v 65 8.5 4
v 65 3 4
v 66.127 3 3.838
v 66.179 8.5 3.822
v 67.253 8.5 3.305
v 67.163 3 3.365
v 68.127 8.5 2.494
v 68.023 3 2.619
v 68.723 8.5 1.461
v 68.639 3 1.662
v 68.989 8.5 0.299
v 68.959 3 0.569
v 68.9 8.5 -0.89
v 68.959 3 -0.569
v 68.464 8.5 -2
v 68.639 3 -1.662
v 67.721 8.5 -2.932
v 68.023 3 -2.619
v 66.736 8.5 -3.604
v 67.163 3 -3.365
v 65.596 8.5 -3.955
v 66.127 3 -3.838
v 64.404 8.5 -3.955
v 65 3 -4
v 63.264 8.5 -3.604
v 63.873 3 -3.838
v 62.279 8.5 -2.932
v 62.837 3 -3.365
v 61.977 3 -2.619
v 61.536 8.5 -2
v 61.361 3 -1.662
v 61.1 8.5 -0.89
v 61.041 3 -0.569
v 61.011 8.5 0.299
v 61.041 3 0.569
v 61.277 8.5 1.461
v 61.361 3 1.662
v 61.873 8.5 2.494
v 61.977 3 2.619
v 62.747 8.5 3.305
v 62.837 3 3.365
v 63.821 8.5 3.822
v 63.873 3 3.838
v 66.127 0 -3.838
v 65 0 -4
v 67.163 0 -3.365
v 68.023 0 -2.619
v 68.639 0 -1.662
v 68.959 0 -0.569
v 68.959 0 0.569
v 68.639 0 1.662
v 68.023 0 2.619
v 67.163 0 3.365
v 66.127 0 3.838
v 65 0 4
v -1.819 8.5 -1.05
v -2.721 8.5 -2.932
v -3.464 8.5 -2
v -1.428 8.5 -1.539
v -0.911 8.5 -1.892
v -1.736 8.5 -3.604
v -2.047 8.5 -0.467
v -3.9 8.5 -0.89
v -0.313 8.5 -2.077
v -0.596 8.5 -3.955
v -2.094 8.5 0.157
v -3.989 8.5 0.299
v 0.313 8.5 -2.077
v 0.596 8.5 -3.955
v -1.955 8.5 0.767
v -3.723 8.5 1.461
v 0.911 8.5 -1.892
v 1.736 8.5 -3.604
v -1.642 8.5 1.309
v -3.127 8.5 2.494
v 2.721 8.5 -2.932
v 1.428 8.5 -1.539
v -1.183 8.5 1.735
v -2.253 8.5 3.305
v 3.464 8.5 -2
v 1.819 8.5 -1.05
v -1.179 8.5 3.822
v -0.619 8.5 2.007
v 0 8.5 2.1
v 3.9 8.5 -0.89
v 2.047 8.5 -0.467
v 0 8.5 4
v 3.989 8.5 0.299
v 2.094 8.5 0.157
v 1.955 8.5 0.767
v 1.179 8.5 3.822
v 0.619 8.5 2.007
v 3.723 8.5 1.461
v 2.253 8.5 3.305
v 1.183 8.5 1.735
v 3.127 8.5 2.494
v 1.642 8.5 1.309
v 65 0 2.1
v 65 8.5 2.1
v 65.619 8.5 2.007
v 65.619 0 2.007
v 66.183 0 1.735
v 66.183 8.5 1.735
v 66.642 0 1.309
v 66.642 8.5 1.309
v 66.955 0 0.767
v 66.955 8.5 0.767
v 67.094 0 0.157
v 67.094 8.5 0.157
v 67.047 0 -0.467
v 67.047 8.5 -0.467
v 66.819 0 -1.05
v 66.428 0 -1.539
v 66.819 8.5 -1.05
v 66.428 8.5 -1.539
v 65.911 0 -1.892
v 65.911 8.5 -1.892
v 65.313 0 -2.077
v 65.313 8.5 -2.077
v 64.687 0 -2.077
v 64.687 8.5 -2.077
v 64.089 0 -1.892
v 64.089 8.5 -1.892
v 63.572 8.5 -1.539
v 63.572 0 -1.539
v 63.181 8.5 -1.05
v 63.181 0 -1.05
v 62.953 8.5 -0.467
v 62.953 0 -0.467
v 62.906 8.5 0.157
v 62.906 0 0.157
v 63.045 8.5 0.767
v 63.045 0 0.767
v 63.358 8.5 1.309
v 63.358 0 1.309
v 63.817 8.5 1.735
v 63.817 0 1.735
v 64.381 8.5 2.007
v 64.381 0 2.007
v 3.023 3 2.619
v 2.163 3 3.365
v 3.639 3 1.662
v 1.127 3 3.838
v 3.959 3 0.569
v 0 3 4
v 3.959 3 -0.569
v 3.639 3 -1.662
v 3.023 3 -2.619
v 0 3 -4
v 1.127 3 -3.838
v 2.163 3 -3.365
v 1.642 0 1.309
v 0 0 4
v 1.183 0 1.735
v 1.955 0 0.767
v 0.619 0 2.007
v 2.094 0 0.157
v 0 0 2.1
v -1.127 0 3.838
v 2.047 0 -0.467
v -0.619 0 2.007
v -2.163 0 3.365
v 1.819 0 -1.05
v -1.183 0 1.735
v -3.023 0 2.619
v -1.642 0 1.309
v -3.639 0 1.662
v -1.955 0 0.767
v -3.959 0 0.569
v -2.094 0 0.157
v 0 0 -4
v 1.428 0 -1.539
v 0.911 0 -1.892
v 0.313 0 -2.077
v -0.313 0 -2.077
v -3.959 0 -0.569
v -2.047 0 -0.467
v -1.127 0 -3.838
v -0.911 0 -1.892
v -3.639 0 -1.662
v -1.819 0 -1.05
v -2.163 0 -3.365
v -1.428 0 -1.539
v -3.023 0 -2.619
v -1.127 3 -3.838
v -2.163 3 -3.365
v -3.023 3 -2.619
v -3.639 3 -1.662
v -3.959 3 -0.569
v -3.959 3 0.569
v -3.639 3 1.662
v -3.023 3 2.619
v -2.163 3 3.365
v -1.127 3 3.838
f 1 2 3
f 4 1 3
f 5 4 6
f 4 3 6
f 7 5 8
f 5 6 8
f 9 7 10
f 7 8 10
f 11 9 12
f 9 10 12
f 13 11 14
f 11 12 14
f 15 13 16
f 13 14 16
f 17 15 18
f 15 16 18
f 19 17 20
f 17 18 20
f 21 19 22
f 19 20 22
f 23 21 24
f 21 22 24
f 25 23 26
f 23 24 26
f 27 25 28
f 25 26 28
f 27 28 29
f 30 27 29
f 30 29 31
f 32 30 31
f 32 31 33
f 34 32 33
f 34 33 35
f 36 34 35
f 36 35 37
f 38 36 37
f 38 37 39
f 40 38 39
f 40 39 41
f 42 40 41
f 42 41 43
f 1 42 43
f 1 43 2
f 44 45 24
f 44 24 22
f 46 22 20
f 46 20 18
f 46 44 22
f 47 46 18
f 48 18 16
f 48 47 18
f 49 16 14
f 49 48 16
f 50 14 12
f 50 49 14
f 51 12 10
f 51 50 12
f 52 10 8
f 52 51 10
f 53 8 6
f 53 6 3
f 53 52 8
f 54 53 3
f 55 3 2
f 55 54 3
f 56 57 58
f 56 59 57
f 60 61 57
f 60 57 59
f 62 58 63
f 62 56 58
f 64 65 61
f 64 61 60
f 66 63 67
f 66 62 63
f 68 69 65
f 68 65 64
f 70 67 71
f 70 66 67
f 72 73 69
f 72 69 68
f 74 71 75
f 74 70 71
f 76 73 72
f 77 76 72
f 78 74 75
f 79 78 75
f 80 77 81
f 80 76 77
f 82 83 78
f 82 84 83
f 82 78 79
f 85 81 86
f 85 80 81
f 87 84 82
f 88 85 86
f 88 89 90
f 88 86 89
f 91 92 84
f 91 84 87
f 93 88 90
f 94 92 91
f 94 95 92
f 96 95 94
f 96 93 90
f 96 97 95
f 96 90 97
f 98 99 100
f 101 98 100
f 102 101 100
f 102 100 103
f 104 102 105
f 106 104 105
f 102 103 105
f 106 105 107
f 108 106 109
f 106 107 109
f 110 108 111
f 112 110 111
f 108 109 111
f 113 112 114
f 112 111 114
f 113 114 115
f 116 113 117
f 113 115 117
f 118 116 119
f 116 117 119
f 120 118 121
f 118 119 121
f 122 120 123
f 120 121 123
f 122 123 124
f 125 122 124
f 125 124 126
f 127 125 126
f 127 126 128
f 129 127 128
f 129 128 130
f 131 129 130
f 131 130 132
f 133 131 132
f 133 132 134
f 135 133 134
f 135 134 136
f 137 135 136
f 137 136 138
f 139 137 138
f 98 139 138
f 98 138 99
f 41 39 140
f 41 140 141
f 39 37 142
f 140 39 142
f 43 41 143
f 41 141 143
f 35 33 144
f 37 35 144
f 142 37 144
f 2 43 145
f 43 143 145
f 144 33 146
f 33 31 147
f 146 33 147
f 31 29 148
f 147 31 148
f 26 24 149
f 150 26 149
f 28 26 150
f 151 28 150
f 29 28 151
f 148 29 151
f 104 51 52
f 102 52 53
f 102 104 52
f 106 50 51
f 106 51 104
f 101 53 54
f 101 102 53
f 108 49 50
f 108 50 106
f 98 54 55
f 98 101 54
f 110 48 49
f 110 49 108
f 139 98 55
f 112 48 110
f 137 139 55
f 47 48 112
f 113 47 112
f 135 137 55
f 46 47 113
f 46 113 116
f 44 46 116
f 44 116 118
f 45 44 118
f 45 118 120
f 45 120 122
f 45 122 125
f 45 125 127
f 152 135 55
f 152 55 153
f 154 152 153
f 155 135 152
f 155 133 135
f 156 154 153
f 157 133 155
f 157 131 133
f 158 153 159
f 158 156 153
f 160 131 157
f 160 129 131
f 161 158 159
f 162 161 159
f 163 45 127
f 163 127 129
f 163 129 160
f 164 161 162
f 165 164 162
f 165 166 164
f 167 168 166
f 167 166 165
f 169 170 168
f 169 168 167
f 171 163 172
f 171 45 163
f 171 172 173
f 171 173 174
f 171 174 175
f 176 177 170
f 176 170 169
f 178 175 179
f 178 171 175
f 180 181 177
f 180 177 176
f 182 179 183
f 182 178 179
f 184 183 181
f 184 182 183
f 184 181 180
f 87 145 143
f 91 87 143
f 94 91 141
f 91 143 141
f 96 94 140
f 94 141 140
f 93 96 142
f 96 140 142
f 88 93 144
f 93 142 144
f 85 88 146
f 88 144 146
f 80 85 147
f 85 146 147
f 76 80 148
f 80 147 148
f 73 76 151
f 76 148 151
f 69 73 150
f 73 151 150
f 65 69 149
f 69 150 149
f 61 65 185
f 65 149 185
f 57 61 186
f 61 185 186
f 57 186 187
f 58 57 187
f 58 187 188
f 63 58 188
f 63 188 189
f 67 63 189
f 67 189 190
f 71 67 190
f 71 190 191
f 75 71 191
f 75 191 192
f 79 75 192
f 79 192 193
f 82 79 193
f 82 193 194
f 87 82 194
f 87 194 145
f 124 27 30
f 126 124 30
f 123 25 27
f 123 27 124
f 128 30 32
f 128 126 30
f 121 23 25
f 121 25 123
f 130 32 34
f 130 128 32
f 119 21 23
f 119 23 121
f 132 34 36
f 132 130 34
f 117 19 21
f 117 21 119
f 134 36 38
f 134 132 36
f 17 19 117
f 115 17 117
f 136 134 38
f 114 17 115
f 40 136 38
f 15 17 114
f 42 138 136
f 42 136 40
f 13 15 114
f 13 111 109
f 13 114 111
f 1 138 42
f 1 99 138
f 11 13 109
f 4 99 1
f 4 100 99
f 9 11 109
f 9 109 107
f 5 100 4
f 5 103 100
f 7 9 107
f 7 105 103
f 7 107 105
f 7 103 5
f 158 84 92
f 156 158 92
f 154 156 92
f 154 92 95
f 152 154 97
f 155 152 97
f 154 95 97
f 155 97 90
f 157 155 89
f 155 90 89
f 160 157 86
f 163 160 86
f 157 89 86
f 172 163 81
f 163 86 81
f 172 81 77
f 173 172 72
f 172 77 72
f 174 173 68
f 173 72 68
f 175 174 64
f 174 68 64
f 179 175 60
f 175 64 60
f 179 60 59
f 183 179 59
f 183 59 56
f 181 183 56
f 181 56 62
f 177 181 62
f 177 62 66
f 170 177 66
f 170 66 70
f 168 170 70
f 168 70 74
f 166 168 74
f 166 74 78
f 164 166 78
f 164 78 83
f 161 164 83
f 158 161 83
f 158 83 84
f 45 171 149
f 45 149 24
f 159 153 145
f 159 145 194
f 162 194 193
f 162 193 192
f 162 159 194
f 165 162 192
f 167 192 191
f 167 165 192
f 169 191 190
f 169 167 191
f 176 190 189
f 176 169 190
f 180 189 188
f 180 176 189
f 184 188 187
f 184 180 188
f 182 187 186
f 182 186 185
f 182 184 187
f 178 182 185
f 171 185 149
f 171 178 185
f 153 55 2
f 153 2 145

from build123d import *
from build123d.topology import SkipClean

# Parameters (mm, degrees)
BOSS_EXTRUDE1_DEPTH = 3
SKETCH3_R           = 4
BOSS_EXTRUDE2_DEPTH = 5.5
SKETCH4_R           = 2.1
CUT_EXTRUDE1_DEPTH  = 70.636556492


with BuildPart() as part:
    # Sketch1 → Boss-Extrude1 (new body)
    with BuildSketch(Plane(origin=(0, 0, 0), x_dir=(1, 0, 0), z_dir=(0, 1, 0))):
        with BuildLine():
            Line((0, 4), (65, 4))
            ThreePointArc((65, 4), (69, 0), (65, -4))
            Line((65, -4), (0, -4))
            ThreePointArc((0, -4), (-4, 0), (0, 4))
        make_face()
    extrude(amount=BOSS_EXTRUDE1_DEPTH)

    # Sketch3 → Boss-Extrude2 (add)
    with SkipClean():  # the faces are left unmerged after this step: merging them gives an invalid solid
        with BuildSketch(Plane(origin=(0, 3, 0), x_dir=(1, 0, 0), z_dir=(0, 1, 0))):
            Circle(SKETCH3_R)
            with Locations((65, 0)):
                Circle(SKETCH3_R)
        extrude(amount=BOSS_EXTRUDE2_DEPTH)

    # Sketch4 → Cut-Extrude1 (cut, through all)
    with SkipClean():  # the faces are left unmerged after this step: merging them gives an invalid solid
        with BuildSketch(Plane(origin=(0, 8.5, 0), x_dir=(1, 0, 0), z_dir=(0, 1, 0))):
            Circle(SKETCH4_R)
            with Locations((65, 0)):
                Circle(SKETCH4_R)
        extrude(amount=-CUT_EXTRUDE1_DEPTH, mode=Mode.SUBTRACT)


solid = part.part
